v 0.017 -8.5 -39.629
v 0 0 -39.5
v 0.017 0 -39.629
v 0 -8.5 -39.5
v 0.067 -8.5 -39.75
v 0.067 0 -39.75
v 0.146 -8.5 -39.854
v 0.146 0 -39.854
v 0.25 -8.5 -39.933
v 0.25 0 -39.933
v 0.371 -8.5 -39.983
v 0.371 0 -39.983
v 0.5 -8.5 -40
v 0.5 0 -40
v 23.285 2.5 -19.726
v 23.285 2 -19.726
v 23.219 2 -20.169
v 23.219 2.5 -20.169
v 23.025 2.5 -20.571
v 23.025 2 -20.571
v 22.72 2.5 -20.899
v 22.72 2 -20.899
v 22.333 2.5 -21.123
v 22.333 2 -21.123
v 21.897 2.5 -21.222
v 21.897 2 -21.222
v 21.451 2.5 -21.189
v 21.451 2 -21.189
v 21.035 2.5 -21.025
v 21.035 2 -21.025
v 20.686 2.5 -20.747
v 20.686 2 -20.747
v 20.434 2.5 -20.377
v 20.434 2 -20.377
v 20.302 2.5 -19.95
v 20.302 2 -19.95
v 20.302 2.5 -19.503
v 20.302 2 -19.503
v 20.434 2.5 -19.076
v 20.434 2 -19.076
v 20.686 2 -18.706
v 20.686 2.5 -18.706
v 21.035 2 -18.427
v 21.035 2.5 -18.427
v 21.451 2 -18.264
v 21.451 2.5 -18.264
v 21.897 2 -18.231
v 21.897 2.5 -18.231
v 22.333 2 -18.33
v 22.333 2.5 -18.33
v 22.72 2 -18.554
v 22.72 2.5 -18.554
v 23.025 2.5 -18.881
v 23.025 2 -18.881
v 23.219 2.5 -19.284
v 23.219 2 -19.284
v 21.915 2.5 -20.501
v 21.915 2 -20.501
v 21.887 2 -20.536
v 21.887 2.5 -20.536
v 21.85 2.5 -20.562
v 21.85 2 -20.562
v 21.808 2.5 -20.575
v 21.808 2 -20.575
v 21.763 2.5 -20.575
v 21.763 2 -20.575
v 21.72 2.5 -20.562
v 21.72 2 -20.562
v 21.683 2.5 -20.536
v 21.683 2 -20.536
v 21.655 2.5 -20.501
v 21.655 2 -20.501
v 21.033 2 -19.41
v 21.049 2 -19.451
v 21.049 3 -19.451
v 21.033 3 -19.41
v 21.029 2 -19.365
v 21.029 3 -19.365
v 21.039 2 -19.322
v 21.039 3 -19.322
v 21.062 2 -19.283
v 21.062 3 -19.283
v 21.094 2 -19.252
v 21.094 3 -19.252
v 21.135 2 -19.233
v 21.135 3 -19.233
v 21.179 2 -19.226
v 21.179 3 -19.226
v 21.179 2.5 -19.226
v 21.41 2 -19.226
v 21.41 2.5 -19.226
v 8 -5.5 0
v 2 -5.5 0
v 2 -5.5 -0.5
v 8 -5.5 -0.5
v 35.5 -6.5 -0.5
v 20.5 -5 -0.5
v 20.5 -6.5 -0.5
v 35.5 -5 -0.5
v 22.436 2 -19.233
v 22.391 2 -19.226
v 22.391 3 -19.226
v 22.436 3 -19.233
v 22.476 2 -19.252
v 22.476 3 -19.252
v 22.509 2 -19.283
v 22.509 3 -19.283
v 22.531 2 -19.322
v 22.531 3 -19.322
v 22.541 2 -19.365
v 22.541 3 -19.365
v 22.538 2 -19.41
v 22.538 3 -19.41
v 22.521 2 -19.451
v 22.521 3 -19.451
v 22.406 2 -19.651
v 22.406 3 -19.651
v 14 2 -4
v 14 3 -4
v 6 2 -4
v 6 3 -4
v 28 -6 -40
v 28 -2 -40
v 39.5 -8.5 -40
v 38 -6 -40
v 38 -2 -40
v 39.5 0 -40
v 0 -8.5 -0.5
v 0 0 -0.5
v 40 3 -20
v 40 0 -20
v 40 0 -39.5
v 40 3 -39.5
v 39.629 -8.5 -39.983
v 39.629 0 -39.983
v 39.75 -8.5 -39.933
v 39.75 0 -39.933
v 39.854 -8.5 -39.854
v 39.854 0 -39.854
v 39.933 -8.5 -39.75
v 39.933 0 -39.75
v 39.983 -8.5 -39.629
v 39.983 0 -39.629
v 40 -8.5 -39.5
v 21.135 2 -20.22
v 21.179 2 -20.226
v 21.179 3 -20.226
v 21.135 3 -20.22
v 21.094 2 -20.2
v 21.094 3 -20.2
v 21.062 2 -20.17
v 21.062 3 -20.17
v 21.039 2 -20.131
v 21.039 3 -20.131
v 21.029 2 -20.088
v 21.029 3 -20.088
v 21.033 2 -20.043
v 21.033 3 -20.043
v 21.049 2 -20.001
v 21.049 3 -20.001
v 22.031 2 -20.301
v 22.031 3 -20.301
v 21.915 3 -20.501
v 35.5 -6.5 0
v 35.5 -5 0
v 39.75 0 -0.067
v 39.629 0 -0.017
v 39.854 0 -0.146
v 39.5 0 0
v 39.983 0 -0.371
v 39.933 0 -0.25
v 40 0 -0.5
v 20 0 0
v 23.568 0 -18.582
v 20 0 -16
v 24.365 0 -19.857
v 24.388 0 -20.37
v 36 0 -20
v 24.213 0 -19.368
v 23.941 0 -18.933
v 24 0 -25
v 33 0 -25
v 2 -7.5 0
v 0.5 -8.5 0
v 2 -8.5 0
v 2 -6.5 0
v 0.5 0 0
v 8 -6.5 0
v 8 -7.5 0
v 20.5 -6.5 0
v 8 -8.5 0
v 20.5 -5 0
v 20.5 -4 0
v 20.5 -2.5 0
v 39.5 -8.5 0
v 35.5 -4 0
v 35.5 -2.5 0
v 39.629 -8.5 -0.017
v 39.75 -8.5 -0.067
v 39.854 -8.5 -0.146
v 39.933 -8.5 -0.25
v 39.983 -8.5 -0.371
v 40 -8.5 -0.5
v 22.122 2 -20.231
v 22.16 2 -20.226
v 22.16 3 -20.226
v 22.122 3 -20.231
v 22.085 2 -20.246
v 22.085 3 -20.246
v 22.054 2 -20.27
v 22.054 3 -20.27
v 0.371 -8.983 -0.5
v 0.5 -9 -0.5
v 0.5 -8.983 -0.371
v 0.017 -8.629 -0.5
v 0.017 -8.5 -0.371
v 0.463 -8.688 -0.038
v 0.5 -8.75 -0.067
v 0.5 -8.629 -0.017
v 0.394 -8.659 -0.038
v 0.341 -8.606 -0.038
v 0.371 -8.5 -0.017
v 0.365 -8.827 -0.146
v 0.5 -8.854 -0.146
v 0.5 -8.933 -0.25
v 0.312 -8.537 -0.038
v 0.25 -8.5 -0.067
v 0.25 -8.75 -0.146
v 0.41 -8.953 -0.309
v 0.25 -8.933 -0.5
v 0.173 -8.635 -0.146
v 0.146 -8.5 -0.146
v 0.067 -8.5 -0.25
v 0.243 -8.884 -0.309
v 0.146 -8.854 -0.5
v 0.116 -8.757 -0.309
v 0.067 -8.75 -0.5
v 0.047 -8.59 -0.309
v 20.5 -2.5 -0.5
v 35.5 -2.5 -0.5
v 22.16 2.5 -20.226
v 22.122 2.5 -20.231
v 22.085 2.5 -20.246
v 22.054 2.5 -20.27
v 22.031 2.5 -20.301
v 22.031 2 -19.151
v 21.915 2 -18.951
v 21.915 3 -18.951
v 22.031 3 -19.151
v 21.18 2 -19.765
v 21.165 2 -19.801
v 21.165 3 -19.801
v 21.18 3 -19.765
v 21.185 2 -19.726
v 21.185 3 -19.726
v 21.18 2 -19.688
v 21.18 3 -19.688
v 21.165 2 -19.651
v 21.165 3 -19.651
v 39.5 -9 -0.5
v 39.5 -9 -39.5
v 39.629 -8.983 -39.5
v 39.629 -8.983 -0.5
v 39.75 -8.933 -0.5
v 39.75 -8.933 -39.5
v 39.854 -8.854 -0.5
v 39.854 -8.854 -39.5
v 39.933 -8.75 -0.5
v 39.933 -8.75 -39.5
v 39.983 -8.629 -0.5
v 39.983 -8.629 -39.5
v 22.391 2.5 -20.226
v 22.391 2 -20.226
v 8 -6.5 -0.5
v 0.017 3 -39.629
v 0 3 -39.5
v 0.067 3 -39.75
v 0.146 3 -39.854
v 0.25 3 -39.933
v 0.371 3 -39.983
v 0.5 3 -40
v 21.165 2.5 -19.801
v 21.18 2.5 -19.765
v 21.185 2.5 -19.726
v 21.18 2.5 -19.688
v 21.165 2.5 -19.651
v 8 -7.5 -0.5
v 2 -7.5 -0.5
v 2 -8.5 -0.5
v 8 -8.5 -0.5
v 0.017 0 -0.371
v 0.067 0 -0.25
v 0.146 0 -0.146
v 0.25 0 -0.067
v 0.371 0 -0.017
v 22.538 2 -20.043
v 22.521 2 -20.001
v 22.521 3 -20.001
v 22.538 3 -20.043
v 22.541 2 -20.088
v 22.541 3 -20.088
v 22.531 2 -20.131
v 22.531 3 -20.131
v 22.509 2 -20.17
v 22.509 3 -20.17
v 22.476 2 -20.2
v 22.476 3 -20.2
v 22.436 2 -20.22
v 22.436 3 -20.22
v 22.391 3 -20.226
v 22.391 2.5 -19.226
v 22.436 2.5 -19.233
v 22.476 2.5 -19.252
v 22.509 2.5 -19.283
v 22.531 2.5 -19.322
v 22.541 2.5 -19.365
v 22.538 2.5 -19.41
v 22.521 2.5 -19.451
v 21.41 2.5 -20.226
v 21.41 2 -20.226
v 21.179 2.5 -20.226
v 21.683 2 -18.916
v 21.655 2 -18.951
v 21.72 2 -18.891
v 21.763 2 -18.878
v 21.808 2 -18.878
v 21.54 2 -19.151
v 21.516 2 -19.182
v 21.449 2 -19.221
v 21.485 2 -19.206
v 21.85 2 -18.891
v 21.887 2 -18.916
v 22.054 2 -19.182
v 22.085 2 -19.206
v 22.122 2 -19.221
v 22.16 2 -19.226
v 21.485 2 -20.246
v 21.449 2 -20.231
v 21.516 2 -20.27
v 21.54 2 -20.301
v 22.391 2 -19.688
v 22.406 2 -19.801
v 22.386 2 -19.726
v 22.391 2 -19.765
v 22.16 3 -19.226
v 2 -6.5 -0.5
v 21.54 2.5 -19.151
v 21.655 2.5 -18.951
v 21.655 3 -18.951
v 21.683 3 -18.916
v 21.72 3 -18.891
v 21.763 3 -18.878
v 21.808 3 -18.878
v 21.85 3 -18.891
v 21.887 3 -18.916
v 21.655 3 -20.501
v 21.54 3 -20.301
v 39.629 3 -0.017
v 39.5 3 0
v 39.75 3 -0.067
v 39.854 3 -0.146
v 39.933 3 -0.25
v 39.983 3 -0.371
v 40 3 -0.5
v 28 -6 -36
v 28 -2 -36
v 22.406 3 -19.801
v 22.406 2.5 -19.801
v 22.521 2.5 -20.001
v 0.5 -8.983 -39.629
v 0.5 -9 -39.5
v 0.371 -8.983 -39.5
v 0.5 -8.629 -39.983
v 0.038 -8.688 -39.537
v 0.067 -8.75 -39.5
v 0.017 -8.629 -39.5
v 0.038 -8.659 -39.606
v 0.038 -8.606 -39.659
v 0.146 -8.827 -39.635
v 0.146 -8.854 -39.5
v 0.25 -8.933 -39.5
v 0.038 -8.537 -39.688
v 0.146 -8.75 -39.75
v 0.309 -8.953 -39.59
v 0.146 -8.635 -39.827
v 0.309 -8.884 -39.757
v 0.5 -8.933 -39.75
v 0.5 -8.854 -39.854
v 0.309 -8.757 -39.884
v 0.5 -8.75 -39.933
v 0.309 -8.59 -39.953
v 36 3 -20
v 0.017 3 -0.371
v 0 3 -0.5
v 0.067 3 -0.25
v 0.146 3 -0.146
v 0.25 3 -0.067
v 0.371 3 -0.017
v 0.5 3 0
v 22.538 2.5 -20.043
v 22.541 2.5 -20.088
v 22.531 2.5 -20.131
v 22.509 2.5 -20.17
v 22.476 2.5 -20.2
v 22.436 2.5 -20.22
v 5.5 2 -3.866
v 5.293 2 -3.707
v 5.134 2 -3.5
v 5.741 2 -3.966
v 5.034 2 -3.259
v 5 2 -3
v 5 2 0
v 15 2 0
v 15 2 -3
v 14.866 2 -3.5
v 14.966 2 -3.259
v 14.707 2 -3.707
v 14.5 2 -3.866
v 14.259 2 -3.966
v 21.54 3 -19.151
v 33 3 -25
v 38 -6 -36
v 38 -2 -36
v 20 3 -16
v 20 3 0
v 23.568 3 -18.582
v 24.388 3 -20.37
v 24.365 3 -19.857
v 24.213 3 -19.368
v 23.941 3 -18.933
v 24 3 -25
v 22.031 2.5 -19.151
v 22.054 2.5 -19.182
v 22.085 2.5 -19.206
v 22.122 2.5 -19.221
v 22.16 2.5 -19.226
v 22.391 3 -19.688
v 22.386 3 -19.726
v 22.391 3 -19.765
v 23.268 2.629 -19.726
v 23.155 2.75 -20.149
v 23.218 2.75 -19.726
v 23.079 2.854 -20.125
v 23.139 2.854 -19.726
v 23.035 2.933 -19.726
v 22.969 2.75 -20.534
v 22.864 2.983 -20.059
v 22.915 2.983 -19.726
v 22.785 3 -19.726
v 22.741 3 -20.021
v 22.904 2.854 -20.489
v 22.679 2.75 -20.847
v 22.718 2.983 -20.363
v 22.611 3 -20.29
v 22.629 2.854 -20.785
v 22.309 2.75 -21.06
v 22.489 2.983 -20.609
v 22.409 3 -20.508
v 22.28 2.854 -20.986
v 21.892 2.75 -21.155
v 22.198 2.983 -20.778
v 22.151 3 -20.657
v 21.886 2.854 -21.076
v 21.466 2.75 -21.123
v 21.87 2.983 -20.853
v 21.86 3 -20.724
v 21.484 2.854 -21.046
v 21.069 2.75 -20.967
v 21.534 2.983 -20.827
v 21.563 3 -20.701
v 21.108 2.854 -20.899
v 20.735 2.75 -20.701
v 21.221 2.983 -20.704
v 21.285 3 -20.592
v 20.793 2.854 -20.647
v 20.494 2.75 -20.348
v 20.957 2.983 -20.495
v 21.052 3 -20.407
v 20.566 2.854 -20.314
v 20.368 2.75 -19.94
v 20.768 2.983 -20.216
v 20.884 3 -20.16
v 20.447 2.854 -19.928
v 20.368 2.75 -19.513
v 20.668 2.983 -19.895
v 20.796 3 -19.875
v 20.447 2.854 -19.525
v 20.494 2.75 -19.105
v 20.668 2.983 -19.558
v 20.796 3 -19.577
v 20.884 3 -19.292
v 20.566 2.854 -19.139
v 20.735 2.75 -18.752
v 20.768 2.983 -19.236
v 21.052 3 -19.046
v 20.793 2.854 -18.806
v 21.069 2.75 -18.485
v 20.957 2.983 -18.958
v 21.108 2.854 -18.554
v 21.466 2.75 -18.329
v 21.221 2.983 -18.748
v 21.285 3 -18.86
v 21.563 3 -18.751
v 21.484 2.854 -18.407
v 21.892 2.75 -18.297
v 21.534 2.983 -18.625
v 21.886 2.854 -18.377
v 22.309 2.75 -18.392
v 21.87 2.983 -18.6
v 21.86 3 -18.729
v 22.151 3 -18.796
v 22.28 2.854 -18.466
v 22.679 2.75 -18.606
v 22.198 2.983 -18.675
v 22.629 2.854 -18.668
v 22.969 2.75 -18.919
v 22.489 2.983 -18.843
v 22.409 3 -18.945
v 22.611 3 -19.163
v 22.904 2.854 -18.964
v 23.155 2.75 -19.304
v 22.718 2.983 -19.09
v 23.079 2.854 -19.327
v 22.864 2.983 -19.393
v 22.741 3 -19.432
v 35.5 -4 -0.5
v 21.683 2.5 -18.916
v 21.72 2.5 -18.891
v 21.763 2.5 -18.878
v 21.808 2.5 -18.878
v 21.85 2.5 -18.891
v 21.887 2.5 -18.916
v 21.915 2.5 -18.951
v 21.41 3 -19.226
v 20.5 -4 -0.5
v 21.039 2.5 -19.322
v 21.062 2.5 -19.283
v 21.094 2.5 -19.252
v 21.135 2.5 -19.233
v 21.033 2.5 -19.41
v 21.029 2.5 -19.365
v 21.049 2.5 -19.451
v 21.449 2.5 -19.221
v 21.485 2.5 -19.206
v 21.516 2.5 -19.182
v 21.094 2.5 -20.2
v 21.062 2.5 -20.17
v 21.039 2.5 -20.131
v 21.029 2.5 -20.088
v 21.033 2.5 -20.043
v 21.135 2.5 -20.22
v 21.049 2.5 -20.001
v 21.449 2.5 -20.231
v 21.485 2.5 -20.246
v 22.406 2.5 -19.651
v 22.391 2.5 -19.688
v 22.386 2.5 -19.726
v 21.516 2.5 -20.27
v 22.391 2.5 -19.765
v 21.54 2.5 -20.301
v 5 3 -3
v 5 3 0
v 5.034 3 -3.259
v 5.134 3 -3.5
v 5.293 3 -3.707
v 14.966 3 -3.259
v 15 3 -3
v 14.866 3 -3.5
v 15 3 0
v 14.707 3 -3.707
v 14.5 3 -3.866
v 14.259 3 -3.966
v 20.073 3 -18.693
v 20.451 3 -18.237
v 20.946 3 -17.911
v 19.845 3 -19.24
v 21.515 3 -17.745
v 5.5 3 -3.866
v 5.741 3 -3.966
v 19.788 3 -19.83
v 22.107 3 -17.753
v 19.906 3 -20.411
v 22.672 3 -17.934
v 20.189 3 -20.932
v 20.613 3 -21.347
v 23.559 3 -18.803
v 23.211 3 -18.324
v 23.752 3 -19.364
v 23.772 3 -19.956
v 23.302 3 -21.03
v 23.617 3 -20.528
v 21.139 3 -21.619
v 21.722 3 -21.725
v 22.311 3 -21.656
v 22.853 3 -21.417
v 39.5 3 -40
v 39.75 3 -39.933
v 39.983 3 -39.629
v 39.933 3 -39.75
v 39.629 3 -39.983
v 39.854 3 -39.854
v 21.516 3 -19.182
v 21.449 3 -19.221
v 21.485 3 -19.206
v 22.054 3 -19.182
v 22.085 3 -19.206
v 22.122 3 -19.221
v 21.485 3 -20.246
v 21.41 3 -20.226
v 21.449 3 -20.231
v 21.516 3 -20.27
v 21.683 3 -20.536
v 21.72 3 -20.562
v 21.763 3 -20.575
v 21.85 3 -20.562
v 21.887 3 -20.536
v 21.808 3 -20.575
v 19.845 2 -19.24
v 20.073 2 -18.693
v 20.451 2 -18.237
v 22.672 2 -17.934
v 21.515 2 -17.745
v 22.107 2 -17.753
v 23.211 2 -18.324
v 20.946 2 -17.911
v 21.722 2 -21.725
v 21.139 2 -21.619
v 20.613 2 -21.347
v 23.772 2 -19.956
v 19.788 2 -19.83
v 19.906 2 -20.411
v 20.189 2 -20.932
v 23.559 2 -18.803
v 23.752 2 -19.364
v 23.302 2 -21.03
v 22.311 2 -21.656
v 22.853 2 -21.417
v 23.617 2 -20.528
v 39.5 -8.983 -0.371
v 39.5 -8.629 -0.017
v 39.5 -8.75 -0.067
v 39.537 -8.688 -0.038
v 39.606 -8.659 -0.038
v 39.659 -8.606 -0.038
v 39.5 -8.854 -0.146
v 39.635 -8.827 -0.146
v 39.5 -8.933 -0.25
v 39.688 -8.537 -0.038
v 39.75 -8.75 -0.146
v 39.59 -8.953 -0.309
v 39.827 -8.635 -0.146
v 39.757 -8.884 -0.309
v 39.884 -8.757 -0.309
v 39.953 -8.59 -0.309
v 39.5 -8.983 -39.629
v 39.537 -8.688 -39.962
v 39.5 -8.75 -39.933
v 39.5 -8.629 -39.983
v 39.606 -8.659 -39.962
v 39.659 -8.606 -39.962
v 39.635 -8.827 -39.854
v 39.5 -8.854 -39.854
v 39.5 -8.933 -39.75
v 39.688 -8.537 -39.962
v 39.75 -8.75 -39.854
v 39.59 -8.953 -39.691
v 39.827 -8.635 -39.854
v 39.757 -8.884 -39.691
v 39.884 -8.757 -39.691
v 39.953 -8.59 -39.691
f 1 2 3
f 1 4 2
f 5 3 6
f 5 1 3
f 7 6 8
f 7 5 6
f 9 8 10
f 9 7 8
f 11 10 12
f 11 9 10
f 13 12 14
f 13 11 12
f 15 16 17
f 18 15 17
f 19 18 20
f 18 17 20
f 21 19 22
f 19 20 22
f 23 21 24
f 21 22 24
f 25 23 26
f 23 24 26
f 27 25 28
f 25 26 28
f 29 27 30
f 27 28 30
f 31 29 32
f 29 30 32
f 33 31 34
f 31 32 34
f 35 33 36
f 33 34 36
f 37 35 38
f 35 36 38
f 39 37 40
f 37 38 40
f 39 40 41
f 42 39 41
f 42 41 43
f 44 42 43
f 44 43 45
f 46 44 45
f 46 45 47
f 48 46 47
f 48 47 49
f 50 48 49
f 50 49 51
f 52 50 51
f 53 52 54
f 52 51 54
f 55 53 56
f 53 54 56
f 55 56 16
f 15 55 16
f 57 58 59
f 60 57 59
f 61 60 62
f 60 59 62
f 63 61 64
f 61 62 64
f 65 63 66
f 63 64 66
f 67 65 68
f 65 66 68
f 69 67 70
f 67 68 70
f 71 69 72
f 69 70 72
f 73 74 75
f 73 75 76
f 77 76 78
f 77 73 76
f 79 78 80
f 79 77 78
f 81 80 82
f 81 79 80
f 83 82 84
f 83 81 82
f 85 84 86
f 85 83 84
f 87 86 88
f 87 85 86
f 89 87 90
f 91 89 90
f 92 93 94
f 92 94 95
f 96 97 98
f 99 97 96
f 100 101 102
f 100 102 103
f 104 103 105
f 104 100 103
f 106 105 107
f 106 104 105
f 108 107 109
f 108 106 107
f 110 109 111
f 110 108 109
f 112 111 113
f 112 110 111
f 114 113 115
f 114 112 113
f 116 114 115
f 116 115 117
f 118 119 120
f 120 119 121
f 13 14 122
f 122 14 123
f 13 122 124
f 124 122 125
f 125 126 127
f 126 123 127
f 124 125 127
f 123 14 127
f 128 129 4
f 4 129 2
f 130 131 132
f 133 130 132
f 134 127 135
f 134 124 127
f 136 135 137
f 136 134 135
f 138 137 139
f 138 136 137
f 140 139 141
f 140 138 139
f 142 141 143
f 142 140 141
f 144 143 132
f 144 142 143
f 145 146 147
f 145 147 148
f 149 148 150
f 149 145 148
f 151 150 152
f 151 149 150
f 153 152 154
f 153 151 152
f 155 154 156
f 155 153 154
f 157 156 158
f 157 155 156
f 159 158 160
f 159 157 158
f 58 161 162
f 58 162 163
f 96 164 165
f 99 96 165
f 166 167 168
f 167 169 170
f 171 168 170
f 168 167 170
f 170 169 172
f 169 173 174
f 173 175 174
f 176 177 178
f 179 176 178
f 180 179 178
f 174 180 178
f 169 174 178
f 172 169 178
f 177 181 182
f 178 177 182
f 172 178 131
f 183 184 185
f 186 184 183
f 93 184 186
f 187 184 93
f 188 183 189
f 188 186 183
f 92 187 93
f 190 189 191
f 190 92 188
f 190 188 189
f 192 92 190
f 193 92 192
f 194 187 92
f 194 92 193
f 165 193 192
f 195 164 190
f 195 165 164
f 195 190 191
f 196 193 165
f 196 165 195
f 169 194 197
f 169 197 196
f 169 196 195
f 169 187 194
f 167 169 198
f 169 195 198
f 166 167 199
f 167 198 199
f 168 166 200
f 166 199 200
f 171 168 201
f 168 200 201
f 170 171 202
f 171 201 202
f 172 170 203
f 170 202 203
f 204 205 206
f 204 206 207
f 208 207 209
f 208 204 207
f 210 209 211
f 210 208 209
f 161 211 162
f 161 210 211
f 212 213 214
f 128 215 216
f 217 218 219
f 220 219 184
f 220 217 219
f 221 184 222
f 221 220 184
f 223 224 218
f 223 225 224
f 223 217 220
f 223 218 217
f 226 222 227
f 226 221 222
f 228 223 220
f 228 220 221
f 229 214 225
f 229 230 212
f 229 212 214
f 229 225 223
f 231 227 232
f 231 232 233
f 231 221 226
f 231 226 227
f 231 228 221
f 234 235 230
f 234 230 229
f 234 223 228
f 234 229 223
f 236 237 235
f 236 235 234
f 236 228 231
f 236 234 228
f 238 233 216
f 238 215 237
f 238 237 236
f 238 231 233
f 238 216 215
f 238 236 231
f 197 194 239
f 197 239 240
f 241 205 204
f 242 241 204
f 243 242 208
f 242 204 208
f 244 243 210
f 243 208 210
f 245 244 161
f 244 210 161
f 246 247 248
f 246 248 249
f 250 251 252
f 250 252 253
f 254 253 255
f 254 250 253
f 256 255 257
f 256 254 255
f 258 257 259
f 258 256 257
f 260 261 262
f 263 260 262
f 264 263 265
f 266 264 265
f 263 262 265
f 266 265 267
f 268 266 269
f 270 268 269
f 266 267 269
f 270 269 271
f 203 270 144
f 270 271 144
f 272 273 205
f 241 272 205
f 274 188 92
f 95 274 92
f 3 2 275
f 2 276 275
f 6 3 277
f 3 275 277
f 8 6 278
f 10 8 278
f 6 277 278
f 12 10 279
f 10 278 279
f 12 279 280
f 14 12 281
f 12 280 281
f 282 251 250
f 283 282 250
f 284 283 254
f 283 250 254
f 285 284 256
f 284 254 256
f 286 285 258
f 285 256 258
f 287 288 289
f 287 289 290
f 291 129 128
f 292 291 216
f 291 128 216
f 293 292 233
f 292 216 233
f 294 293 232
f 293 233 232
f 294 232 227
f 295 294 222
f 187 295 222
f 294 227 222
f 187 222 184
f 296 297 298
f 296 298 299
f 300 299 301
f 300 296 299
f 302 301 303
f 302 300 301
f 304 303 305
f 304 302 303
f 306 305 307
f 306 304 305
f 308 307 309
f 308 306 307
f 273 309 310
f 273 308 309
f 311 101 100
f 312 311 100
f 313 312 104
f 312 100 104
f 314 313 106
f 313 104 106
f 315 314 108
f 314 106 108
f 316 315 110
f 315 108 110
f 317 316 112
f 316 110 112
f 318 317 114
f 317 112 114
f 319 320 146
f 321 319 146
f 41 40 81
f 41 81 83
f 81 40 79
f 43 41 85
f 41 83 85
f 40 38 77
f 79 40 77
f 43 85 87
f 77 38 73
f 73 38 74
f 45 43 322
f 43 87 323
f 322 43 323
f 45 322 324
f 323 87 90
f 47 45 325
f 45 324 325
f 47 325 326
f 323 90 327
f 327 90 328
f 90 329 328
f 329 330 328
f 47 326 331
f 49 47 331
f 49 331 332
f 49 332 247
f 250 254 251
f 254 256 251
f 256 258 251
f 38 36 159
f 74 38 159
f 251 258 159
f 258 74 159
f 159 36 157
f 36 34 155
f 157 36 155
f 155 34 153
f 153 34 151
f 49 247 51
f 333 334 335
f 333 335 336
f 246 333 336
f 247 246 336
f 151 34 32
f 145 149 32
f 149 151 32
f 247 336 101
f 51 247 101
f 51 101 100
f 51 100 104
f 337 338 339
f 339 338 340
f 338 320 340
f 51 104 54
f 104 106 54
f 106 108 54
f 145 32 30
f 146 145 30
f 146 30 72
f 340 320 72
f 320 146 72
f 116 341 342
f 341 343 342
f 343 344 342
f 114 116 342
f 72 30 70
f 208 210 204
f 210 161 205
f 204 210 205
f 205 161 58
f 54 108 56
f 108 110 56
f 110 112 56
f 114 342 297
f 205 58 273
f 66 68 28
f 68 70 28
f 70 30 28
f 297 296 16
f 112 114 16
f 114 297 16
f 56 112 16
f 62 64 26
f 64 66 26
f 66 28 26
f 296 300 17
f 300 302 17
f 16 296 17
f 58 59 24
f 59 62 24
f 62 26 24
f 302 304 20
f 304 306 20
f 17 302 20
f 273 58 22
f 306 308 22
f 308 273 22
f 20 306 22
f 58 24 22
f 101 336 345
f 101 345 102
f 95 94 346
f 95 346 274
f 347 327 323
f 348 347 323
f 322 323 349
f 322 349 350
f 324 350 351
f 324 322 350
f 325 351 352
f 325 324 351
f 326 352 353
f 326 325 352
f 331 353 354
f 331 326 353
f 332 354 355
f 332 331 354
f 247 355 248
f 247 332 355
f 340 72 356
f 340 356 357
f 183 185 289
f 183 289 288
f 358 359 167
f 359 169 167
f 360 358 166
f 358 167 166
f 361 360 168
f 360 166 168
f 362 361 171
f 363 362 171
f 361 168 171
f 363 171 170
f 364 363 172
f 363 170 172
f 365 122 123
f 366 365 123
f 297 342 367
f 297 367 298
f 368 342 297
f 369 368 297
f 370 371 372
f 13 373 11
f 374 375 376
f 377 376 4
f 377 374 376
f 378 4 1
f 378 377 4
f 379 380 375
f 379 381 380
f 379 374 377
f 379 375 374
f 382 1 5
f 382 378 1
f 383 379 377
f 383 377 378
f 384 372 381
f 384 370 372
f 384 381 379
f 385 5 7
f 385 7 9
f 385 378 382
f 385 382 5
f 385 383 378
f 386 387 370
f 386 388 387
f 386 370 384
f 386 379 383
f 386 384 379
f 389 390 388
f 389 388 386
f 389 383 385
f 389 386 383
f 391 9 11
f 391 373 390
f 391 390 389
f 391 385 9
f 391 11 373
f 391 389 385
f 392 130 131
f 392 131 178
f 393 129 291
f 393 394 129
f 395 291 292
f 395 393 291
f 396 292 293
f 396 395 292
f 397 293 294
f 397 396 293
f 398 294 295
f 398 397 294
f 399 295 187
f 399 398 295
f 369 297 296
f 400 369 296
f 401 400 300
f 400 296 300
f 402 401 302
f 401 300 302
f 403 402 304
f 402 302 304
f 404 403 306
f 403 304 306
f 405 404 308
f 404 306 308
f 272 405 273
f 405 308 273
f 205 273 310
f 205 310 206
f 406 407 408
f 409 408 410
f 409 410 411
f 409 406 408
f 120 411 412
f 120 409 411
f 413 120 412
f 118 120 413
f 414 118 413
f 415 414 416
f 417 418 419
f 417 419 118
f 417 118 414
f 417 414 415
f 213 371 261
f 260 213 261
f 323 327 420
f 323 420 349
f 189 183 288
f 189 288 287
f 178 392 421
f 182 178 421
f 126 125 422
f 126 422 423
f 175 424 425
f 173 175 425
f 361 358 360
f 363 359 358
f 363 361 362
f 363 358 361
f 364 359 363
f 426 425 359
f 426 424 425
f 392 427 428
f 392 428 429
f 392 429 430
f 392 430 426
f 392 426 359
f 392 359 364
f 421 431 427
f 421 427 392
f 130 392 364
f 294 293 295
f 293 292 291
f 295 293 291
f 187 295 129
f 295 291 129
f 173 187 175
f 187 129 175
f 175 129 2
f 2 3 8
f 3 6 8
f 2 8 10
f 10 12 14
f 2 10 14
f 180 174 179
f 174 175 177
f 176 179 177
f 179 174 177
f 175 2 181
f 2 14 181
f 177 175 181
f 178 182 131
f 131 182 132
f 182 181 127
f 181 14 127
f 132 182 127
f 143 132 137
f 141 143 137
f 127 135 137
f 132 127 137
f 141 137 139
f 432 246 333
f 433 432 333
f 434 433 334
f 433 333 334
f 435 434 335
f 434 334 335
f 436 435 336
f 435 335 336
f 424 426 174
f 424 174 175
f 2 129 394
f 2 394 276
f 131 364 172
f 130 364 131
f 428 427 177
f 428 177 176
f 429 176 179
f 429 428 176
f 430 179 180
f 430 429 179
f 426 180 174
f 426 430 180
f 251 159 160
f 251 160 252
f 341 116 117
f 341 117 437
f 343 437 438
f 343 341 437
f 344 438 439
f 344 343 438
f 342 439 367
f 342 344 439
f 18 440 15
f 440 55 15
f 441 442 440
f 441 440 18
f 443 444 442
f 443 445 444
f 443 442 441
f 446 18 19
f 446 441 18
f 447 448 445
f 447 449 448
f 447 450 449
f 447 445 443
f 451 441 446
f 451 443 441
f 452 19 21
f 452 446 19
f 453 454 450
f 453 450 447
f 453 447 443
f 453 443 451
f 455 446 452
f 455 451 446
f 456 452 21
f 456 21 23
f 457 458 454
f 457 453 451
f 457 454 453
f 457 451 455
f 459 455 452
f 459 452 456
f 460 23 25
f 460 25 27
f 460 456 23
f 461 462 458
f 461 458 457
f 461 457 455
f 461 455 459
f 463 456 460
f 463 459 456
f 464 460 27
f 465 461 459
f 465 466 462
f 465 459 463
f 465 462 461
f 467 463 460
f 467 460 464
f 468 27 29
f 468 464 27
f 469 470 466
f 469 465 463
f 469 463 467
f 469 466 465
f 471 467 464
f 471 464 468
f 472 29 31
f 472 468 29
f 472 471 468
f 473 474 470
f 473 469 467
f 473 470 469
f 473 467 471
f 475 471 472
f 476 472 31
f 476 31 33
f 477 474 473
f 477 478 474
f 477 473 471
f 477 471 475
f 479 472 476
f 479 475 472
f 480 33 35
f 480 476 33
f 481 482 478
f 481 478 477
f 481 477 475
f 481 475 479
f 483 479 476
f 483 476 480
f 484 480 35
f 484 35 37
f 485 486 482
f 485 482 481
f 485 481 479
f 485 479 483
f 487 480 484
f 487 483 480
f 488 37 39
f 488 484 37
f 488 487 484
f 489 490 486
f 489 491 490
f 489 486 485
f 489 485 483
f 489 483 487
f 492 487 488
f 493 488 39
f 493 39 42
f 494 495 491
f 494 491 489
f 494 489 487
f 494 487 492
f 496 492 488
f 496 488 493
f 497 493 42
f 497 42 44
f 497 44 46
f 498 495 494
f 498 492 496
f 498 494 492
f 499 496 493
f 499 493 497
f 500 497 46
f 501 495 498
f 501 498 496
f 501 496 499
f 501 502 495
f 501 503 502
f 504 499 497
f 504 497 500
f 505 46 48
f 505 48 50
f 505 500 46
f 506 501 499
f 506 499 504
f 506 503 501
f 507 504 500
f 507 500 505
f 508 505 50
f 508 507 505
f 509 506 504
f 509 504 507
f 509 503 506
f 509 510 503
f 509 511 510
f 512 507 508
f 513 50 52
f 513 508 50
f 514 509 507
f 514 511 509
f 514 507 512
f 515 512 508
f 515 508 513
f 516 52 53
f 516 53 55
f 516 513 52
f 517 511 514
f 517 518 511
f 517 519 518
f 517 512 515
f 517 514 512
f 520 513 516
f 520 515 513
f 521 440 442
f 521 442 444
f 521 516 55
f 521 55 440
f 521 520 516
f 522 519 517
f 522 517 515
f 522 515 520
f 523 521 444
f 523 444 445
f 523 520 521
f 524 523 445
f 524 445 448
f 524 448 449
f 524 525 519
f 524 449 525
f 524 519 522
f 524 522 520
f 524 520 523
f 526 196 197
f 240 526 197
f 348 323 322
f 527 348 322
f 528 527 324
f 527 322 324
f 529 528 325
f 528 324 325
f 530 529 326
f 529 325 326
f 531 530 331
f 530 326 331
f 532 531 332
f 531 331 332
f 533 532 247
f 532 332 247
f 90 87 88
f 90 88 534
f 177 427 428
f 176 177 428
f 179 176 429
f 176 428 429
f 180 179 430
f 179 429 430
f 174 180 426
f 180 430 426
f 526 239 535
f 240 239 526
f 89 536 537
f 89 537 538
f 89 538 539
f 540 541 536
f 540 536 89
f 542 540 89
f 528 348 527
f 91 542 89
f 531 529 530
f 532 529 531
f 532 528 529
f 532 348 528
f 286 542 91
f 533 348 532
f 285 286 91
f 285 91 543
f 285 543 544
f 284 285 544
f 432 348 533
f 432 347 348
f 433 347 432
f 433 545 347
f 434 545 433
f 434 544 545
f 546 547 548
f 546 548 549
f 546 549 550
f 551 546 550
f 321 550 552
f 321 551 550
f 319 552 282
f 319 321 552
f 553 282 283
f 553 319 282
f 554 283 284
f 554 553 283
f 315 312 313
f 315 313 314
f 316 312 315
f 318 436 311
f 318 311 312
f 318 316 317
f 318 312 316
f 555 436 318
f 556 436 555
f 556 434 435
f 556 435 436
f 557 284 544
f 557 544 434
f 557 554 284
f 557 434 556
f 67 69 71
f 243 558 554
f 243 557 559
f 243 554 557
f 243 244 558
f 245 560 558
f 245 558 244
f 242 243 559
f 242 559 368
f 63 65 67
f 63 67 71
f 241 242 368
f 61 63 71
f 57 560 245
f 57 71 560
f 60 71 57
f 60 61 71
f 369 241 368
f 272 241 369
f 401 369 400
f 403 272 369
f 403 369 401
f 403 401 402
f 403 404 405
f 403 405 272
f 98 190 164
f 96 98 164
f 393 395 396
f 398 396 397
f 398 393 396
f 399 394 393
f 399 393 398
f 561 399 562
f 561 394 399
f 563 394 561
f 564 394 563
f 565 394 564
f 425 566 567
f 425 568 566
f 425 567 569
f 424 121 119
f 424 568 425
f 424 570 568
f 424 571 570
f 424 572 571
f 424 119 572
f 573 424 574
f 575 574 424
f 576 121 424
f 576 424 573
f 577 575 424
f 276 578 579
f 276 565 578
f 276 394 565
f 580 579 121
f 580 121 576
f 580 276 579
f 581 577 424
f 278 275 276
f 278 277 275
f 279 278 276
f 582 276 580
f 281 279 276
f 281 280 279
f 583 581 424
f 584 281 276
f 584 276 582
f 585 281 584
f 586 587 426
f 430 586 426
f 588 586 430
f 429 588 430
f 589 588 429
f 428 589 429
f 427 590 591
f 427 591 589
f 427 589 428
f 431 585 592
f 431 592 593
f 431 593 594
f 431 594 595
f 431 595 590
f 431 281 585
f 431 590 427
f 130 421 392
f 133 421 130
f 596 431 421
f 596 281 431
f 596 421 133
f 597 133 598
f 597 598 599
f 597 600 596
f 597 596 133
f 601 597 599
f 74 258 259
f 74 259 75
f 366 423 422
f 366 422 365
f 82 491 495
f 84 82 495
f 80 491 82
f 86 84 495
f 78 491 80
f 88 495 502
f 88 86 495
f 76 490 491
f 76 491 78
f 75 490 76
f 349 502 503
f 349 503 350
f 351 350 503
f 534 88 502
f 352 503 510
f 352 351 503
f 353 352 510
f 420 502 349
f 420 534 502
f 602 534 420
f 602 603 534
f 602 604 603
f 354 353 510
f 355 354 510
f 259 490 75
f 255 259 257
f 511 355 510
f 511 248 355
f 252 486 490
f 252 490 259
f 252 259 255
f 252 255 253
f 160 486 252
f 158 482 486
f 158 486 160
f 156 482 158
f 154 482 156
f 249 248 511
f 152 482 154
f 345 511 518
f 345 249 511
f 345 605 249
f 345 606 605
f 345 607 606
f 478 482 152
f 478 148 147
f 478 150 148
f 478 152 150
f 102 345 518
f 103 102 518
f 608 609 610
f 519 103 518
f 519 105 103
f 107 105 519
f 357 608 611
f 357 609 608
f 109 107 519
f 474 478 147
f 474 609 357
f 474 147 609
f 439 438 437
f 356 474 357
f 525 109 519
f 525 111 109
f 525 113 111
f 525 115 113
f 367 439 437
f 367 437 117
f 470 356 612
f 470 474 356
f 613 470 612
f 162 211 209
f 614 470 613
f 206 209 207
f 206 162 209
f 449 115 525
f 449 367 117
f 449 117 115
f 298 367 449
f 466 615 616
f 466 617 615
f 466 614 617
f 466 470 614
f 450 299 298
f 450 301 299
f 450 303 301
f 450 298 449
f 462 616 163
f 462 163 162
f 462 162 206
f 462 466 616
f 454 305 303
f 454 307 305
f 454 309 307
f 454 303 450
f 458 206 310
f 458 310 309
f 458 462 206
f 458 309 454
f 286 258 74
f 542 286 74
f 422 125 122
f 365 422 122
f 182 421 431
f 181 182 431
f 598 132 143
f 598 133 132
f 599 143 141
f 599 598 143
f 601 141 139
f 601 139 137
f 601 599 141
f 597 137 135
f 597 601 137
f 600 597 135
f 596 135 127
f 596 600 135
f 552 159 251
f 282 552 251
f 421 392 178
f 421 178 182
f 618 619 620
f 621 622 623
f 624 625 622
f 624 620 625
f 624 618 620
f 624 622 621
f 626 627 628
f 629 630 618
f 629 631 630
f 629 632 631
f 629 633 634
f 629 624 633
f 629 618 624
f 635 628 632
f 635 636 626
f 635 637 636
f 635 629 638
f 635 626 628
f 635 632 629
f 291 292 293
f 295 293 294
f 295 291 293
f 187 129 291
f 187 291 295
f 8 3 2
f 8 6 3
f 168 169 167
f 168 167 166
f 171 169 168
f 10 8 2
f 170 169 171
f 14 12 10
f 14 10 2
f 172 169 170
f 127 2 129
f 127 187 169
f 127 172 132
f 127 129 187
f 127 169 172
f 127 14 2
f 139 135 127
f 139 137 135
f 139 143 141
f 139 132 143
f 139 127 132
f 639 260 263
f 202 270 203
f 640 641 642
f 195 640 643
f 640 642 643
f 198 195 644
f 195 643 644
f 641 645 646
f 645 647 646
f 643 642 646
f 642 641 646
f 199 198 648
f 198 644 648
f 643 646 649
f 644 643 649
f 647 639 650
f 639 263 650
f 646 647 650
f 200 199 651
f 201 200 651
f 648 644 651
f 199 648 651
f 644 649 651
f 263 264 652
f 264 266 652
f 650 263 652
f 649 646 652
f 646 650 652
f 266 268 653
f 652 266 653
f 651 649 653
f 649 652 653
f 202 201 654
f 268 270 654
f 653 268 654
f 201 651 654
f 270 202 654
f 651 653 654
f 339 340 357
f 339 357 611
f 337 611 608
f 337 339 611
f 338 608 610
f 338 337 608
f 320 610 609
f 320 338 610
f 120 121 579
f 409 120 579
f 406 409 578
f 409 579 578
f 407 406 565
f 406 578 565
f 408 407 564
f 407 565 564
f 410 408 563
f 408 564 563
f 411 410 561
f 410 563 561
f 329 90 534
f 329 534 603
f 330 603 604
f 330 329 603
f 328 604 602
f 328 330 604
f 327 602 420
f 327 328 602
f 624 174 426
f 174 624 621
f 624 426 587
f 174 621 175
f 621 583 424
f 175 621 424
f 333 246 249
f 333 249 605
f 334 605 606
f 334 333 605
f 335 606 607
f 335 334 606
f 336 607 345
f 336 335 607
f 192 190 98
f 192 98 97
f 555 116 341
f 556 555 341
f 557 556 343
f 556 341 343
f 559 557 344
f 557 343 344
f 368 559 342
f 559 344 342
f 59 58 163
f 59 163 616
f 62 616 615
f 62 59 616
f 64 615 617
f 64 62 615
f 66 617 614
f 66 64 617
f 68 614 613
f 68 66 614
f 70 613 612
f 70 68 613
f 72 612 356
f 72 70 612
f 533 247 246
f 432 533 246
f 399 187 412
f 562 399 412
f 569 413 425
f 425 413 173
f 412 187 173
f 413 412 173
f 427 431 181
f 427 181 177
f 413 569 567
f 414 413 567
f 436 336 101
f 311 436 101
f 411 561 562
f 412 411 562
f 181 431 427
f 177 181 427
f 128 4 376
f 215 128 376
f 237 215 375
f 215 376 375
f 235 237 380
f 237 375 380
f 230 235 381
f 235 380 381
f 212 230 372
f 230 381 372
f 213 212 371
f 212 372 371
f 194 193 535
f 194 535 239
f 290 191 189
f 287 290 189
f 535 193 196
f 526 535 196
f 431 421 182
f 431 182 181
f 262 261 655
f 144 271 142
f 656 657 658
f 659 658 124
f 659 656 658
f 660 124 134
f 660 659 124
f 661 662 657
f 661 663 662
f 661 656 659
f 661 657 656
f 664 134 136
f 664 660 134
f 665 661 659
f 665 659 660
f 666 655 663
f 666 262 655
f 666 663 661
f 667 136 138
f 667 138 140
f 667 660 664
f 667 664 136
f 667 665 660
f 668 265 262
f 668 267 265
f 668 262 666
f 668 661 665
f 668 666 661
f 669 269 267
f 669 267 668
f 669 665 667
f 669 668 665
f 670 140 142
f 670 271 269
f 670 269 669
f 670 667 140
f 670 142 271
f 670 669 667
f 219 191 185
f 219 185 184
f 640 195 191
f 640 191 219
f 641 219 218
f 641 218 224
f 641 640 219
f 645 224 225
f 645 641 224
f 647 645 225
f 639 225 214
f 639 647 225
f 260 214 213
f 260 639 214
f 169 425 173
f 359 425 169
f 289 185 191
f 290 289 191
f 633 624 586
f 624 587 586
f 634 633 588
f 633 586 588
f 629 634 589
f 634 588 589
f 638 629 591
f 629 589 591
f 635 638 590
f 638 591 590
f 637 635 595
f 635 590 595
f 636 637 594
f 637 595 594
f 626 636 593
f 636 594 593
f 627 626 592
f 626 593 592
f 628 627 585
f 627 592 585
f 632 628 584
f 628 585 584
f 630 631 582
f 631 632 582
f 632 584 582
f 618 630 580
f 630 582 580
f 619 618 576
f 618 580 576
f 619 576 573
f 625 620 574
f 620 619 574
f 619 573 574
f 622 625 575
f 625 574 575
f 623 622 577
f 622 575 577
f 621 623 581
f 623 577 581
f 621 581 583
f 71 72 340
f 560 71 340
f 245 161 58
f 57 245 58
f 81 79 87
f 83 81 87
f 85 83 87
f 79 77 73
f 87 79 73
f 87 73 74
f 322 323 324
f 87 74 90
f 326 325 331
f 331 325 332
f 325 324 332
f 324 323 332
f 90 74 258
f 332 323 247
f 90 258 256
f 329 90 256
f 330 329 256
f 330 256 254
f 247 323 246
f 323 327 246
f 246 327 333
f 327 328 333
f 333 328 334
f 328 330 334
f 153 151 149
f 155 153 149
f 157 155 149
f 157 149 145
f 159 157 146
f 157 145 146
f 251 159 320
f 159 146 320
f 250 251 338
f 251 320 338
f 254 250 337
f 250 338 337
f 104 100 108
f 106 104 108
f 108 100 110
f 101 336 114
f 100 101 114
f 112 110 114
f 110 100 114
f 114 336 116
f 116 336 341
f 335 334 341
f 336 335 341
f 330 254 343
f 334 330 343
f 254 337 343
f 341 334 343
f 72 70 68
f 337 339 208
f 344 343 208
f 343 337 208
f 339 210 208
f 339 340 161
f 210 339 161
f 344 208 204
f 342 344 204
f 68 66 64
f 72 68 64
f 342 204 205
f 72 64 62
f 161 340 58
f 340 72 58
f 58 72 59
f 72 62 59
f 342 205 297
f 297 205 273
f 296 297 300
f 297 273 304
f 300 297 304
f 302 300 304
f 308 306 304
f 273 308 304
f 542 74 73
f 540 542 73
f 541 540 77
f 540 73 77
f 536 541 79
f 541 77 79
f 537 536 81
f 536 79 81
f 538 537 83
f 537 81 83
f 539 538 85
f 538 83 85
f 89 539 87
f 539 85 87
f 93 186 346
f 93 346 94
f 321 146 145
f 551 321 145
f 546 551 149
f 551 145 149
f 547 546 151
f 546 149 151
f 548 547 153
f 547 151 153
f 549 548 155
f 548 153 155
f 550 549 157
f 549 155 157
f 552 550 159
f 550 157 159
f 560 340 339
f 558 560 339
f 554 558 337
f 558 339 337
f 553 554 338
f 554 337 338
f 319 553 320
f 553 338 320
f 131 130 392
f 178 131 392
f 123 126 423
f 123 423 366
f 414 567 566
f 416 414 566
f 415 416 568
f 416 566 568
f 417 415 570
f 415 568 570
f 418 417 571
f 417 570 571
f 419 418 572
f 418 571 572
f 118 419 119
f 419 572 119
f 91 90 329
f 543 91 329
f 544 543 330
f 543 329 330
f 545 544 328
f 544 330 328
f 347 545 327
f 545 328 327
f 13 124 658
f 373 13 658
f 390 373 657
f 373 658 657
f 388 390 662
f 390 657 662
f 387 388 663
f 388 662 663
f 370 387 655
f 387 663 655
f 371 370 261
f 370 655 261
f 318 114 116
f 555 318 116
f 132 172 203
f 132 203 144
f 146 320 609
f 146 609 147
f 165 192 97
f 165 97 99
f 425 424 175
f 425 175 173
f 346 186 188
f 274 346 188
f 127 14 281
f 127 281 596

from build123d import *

# Parameters (mm, degrees)
SKETCH1_W           = 40
SKETCH1_H           = 40
BOSS_EXTRUDE1_DEPTH = 9
SKETCH1_2_W         = 40
SKETCH1_2_H         = 40
BOSS_EXTRUDE2_DEPTH = 3
SKETCH2_W           = 10
SKETCH2_H           = 4
CUT_EXTRUDE1_DEPTH  = 4
CUT_EXTRUDE3_DEPTH  = 3
BOSS_EXTRUDE4_DEPTH = 3
SKETCH4_R           = 2
CUT_EXTRUDE4_DEPTH  = 1
SKETCH5_R           = 1.5
BOSS_EXTRUDE6_DEPTH = 1
BOSS_EXTRUDE7_DEPTH = 0.5
FILLET1_R           = 0.5
FILLET2_R           = 0.5
FILLET3_R           = 0.5
FILLET4_R           = 0.5
SKETCH6_W           = 6
SKETCH6_H           = 1
SKETCH6_W_2         = 15
SKETCH6_H_2         = 1.5
CUT_EXTRUDE5_DEPTH  = 0.5


with BuildPart() as part:
    # Sketch1 → Boss-Extrude1 (new body)
    with BuildSketch(Plane(origin=(0, 0, 0), x_dir=(1, 0, 0), z_dir=(0, 1, 0))):
        with Locations((20, 20)):
            Rectangle(SKETCH1_W, SKETCH1_H)
    extrude(amount=-BOSS_EXTRUDE1_DEPTH)

    # Sketch2 → Cut-Extrude1 (cut)
    with BuildSketch(Plane(origin=(0, 0, -40), x_dir=(-1, 0, 0), z_dir=(0, 0, -1))):
        with Locations((-33, -4)):
            Rectangle(SKETCH2_W, SKETCH2_H)
    extrude(amount=-CUT_EXTRUDE1_DEPTH, mode=Mode.SUBTRACT)

    # Fillet3
    fillet3_edges = [part.edges().sort_by_distance(p)[0] for p in [
        (40, -9, -20),
        (20, -9, -40),
        (0, -9, -20),
        (20, -9, 0),
        (0, -4.5, -40),
        (40, -4.5, -40),
        (40, -4.5, 0),
        (0, -4.5, 0),
    ]]
    fillet(fillet3_edges, radius=FILLET3_R)

    # Sketch6 → Cut-Extrude5 (cut)
    with BuildSketch(Plane.XY):
        with Locations((5, -8)):
            Rectangle(SKETCH6_W, SKETCH6_H)
        with Locations((5, -6)):
            Rectangle(SKETCH6_W, SKETCH6_H)
        with Locations((28, -3.25)):
            Rectangle(SKETCH6_W_2, SKETCH6_H_2)
        with Locations((28, -5.75)):
            Rectangle(SKETCH6_W_2, SKETCH6_H_2)
    extrude(amount=-CUT_EXTRUDE5_DEPTH, mode=Mode.SUBTRACT)


with BuildPart() as body_2:
    # Sketch1<2> → Boss-Extrude2 (new body)
    with BuildSketch(Plane(origin=(0, 0, 0), x_dir=(1, 0, 0), z_dir=(0, 1, 0))):
        with Locations((20, 20)):
            Rectangle(SKETCH1_2_W, SKETCH1_2_H)
    extrude(amount=BOSS_EXTRUDE2_DEPTH)

    # Sketch3 → Cut-Extrude3 (cut)
    with BuildSketch(Plane(origin=(0, 3, 0), x_dir=(1, 0, 0), z_dir=(0, 1, 0))):
        with BuildLine():
            Line((20, 0), (40, 0))
            Line((40, 0), (40, 20))
            Line((40, 20), (36, 20))
            Line((36, 20), (33, 25))
            Line((33, 25), (24, 25))
            Line((24, 25), (24.388369501, 20.369543813))
            ThreePointArc((24.388369501, 20.369543813), (24.213026482, 19.368050032), (23.567938987, 18.582176574))
            Line((23.567938987, 18.582176574), (20, 16))
            Line((20, 16), (20, 0))
        make_face()
    extrude(amount=-CUT_EXTRUDE3_DEPTH, mode=Mode.SUBTRACT)

    # Sketch4 → Cut-Extrude4 (cut)
    with BuildSketch(Plane(origin=(0, 3, 0), x_dir=(1, 0, 0), z_dir=(0, 1, 0))):
        with Locations((21.785213292, 19.72637998)):
            Circle(SKETCH4_R)
        with BuildLine():
            Line((5, 0), (15, 0))
            Line((15, 0), (15, 3))
            ThreePointArc((15, 3), (14.707106781, 3.707106781), (14, 4))
            Line((14, 4), (6, 4))
            ThreePointArc((6, 4), (5.292893219, 3.707106781), (5, 3))
            Line((5, 3), (5, 0))
        make_face()
    extrude(amount=-CUT_EXTRUDE4_DEPTH, mode=Mode.SUBTRACT)

    # Fillet2
    fillet2_edges = [body_2.edges().sort_by_distance(p)[0] for p in [
        (0, 1.5, -40),
        (40, 1.5, -40),
        (0, 1.5, 0),
    ]]
    fillet(fillet2_edges, radius=FILLET2_R)


with BuildPart() as body_3:
    # Sketch3<3> → Boss-Extrude4 (new body)
    with BuildSketch(Plane(origin=(0, 3, 0), x_dir=(1, 0, 0), z_dir=(0, 1, 0))):
        with BuildLine():
            Line((20, 0), (40, 0))
            Line((40, 0), (40, 20))
            Line((40, 20), (36, 20))
            Line((36, 20), (33, 25))
            Line((33, 25), (24, 25))
            Line((24, 25), (24.388369501, 20.369543813))
            ThreePointArc((24.388369501, 20.369543813), (24.213026482, 19.368050032), (23.567938987, 18.582176574))
            Line((23.567938987, 18.582176574), (20, 16))
            Line((20, 16), (20, 0))
        make_face()
    extrude(amount=-BOSS_EXTRUDE4_DEPTH)

    # Fillet4
    fillet4_edges = [body_3.edges().sort_by_distance(p)[0] for p in [
        (40, 1.5, 0),
    ]]
    fillet(fillet4_edges, radius=FILLET4_R)


with BuildPart() as body_4:
    # Sketch5 → Boss-Extrude6 (new body)
    with BuildSketch(Plane(origin=(0, 2, 0), x_dir=(1, 0, 0), z_dir=(0, 1, 0))):
        with Locations((21.785213292, 19.72637998)):
            Circle(SKETCH5_R)
        with BuildLine():
            Line((21.409935617, 20.22637998), (21.178995509, 20.22637998))
            ThreePointArc((21.178995509, 20.22637998), (21.049091699, 20.15137998), (21.049091699, 20.00137998))
            Line((21.049091699, 20.00137998), (21.164561753, 19.80137998))
            ThreePointArc((21.164561753, 19.80137998), (21.184657942, 19.72637998), (21.164561753, 19.65137998))
            Line((21.164561753, 19.65137998), (21.049091699, 19.45137998))
            ThreePointArc((21.049091699, 19.45137998), (21.049091699, 19.30137998), (21.178995509, 19.22637998))
            Line((21.178995509, 19.22637998), (21.409935617, 19.22637998))
            ThreePointArc((21.409935617, 19.22637998), (21.484935617, 19.20628379), (21.539839428, 19.15137998))
            Line((21.539839428, 19.15137998), (21.655309481, 18.95137998))
            ThreePointArc((21.655309481, 18.95137998), (21.785213292, 18.87637998), (21.915117103, 18.95137998))
            Line((21.915117103, 18.95137998), (22.030587156, 19.15137998))
            ThreePointArc((22.030587156, 19.15137998), (22.085490967, 19.20628379), (22.160490967, 19.22637998))
            Line((22.160490967, 19.22637998), (22.391431075, 19.22637998))
            ThreePointArc((22.391431075, 19.22637998), (22.521334885, 19.30137998), (22.521334885, 19.45137998))
            Line((22.521334885, 19.45137998), (22.405864831, 19.65137998))
            ThreePointArc((22.405864831, 19.65137998), (22.385768642, 19.72637998), (22.405864831, 19.80137998))
            Line((22.405864831, 19.80137998), (22.521334885, 20.00137998))
            ThreePointArc((22.521334885, 20.00137998), (22.521334885, 20.15137998), (22.391431075, 20.22637998))
            Line((22.391431075, 20.22637998), (22.160490967, 20.22637998))
            ThreePointArc((22.160490967, 20.22637998), (22.085490967, 20.246476169), (22.030587156, 20.30137998))
            Line((22.030587156, 20.30137998), (21.915117103, 20.50137998))
            ThreePointArc((21.915117103, 20.50137998), (21.785213292, 20.57637998), (21.655309481, 20.50137998))
            Line((21.655309481, 20.50137998), (21.539839428, 20.30137998))
            ThreePointArc((21.539839428, 20.30137998), (21.484935617, 20.246476169), (21.409935617, 20.22637998))
        make_face(mode=Mode.SUBTRACT)
    extrude(amount=BOSS_EXTRUDE6_DEPTH)

    # Fillet1
    fillet1_edges = [body_4.edges().sort_by_distance(p)[0] for p in [
        (20.285213292, 3, -19.72637998),
    ]]
    fillet(fillet1_edges, radius=FILLET1_R)


with BuildPart() as body_5:
    # Sketch5<2> → Boss-Extrude7 (new body)
    with BuildSketch(Plane(origin=(0, 2, 0), x_dir=(1, 0, 0), z_dir=(0, 1, 0))):
        with BuildLine():
            Line((22.030587156, 20.30137998), (21.915117103, 20.50137998))
            ThreePointArc((21.915117103, 20.50137998), (21.785213292, 20.57637998), (21.655309481, 20.50137998))
            Line((21.655309481, 20.50137998), (21.539839428, 20.30137998))
            ThreePointArc((21.539839428, 20.30137998), (21.484935617, 20.246476169), (21.409935617, 20.22637998))
            Line((21.409935617, 20.22637998), (21.178995509, 20.22637998))
            ThreePointArc((21.178995509, 20.22637998), (21.049091699, 20.15137998), (21.049091699, 20.00137998))
            Line((21.049091699, 20.00137998), (21.164561753, 19.80137998))
            ThreePointArc((21.164561753, 19.80137998), (21.184657942, 19.72637998), (21.164561753, 19.65137998))
            Line((21.164561753, 19.65137998), (21.049091699, 19.45137998))
            ThreePointArc((21.049091699, 19.45137998), (21.049091699, 19.30137998), (21.178995509, 19.22637998))
            Line((21.178995509, 19.22637998), (21.409935617, 19.22637998))
            ThreePointArc((21.409935617, 19.22637998), (21.484935617, 19.20628379), (21.539839428, 19.15137998))
            Line((21.539839428, 19.15137998), (21.655309481, 18.95137998))
            ThreePointArc((21.655309481, 18.95137998), (21.785213292, 18.87637998), (21.915117103, 18.95137998))
            Line((21.915117103, 18.95137998), (22.030587156, 19.15137998))
            ThreePointArc((22.030587156, 19.15137998), (22.085490967, 19.20628379), (22.160490967, 19.22637998))
            Line((22.160490967, 19.22637998), (22.391431075, 19.22637998))
            ThreePointArc((22.391431075, 19.22637998), (22.521334885, 19.30137998), (22.521334885, 19.45137998))
            Line((22.521334885, 19.45137998), (22.405864831, 19.65137998))
            ThreePointArc((22.405864831, 19.65137998), (22.385768642, 19.72637998), (22.405864831, 19.80137998))
            Line((22.405864831, 19.80137998), (22.521334885, 20.00137998))
            ThreePointArc((22.521334885, 20.00137998), (22.521334885, 20.15137998), (22.391431075, 20.22637998))
            Line((22.391431075, 20.22637998), (22.160490967, 20.22637998))
            ThreePointArc((22.160490967, 20.22637998), (22.085490967, 20.246476169), (22.030587156, 20.30137998))
        make_face()
    extrude(amount=BOSS_EXTRUDE7_DEPTH)


solid = Compound([part.part, body_2.part, body_3.part, body_4.part, body_5.part])
